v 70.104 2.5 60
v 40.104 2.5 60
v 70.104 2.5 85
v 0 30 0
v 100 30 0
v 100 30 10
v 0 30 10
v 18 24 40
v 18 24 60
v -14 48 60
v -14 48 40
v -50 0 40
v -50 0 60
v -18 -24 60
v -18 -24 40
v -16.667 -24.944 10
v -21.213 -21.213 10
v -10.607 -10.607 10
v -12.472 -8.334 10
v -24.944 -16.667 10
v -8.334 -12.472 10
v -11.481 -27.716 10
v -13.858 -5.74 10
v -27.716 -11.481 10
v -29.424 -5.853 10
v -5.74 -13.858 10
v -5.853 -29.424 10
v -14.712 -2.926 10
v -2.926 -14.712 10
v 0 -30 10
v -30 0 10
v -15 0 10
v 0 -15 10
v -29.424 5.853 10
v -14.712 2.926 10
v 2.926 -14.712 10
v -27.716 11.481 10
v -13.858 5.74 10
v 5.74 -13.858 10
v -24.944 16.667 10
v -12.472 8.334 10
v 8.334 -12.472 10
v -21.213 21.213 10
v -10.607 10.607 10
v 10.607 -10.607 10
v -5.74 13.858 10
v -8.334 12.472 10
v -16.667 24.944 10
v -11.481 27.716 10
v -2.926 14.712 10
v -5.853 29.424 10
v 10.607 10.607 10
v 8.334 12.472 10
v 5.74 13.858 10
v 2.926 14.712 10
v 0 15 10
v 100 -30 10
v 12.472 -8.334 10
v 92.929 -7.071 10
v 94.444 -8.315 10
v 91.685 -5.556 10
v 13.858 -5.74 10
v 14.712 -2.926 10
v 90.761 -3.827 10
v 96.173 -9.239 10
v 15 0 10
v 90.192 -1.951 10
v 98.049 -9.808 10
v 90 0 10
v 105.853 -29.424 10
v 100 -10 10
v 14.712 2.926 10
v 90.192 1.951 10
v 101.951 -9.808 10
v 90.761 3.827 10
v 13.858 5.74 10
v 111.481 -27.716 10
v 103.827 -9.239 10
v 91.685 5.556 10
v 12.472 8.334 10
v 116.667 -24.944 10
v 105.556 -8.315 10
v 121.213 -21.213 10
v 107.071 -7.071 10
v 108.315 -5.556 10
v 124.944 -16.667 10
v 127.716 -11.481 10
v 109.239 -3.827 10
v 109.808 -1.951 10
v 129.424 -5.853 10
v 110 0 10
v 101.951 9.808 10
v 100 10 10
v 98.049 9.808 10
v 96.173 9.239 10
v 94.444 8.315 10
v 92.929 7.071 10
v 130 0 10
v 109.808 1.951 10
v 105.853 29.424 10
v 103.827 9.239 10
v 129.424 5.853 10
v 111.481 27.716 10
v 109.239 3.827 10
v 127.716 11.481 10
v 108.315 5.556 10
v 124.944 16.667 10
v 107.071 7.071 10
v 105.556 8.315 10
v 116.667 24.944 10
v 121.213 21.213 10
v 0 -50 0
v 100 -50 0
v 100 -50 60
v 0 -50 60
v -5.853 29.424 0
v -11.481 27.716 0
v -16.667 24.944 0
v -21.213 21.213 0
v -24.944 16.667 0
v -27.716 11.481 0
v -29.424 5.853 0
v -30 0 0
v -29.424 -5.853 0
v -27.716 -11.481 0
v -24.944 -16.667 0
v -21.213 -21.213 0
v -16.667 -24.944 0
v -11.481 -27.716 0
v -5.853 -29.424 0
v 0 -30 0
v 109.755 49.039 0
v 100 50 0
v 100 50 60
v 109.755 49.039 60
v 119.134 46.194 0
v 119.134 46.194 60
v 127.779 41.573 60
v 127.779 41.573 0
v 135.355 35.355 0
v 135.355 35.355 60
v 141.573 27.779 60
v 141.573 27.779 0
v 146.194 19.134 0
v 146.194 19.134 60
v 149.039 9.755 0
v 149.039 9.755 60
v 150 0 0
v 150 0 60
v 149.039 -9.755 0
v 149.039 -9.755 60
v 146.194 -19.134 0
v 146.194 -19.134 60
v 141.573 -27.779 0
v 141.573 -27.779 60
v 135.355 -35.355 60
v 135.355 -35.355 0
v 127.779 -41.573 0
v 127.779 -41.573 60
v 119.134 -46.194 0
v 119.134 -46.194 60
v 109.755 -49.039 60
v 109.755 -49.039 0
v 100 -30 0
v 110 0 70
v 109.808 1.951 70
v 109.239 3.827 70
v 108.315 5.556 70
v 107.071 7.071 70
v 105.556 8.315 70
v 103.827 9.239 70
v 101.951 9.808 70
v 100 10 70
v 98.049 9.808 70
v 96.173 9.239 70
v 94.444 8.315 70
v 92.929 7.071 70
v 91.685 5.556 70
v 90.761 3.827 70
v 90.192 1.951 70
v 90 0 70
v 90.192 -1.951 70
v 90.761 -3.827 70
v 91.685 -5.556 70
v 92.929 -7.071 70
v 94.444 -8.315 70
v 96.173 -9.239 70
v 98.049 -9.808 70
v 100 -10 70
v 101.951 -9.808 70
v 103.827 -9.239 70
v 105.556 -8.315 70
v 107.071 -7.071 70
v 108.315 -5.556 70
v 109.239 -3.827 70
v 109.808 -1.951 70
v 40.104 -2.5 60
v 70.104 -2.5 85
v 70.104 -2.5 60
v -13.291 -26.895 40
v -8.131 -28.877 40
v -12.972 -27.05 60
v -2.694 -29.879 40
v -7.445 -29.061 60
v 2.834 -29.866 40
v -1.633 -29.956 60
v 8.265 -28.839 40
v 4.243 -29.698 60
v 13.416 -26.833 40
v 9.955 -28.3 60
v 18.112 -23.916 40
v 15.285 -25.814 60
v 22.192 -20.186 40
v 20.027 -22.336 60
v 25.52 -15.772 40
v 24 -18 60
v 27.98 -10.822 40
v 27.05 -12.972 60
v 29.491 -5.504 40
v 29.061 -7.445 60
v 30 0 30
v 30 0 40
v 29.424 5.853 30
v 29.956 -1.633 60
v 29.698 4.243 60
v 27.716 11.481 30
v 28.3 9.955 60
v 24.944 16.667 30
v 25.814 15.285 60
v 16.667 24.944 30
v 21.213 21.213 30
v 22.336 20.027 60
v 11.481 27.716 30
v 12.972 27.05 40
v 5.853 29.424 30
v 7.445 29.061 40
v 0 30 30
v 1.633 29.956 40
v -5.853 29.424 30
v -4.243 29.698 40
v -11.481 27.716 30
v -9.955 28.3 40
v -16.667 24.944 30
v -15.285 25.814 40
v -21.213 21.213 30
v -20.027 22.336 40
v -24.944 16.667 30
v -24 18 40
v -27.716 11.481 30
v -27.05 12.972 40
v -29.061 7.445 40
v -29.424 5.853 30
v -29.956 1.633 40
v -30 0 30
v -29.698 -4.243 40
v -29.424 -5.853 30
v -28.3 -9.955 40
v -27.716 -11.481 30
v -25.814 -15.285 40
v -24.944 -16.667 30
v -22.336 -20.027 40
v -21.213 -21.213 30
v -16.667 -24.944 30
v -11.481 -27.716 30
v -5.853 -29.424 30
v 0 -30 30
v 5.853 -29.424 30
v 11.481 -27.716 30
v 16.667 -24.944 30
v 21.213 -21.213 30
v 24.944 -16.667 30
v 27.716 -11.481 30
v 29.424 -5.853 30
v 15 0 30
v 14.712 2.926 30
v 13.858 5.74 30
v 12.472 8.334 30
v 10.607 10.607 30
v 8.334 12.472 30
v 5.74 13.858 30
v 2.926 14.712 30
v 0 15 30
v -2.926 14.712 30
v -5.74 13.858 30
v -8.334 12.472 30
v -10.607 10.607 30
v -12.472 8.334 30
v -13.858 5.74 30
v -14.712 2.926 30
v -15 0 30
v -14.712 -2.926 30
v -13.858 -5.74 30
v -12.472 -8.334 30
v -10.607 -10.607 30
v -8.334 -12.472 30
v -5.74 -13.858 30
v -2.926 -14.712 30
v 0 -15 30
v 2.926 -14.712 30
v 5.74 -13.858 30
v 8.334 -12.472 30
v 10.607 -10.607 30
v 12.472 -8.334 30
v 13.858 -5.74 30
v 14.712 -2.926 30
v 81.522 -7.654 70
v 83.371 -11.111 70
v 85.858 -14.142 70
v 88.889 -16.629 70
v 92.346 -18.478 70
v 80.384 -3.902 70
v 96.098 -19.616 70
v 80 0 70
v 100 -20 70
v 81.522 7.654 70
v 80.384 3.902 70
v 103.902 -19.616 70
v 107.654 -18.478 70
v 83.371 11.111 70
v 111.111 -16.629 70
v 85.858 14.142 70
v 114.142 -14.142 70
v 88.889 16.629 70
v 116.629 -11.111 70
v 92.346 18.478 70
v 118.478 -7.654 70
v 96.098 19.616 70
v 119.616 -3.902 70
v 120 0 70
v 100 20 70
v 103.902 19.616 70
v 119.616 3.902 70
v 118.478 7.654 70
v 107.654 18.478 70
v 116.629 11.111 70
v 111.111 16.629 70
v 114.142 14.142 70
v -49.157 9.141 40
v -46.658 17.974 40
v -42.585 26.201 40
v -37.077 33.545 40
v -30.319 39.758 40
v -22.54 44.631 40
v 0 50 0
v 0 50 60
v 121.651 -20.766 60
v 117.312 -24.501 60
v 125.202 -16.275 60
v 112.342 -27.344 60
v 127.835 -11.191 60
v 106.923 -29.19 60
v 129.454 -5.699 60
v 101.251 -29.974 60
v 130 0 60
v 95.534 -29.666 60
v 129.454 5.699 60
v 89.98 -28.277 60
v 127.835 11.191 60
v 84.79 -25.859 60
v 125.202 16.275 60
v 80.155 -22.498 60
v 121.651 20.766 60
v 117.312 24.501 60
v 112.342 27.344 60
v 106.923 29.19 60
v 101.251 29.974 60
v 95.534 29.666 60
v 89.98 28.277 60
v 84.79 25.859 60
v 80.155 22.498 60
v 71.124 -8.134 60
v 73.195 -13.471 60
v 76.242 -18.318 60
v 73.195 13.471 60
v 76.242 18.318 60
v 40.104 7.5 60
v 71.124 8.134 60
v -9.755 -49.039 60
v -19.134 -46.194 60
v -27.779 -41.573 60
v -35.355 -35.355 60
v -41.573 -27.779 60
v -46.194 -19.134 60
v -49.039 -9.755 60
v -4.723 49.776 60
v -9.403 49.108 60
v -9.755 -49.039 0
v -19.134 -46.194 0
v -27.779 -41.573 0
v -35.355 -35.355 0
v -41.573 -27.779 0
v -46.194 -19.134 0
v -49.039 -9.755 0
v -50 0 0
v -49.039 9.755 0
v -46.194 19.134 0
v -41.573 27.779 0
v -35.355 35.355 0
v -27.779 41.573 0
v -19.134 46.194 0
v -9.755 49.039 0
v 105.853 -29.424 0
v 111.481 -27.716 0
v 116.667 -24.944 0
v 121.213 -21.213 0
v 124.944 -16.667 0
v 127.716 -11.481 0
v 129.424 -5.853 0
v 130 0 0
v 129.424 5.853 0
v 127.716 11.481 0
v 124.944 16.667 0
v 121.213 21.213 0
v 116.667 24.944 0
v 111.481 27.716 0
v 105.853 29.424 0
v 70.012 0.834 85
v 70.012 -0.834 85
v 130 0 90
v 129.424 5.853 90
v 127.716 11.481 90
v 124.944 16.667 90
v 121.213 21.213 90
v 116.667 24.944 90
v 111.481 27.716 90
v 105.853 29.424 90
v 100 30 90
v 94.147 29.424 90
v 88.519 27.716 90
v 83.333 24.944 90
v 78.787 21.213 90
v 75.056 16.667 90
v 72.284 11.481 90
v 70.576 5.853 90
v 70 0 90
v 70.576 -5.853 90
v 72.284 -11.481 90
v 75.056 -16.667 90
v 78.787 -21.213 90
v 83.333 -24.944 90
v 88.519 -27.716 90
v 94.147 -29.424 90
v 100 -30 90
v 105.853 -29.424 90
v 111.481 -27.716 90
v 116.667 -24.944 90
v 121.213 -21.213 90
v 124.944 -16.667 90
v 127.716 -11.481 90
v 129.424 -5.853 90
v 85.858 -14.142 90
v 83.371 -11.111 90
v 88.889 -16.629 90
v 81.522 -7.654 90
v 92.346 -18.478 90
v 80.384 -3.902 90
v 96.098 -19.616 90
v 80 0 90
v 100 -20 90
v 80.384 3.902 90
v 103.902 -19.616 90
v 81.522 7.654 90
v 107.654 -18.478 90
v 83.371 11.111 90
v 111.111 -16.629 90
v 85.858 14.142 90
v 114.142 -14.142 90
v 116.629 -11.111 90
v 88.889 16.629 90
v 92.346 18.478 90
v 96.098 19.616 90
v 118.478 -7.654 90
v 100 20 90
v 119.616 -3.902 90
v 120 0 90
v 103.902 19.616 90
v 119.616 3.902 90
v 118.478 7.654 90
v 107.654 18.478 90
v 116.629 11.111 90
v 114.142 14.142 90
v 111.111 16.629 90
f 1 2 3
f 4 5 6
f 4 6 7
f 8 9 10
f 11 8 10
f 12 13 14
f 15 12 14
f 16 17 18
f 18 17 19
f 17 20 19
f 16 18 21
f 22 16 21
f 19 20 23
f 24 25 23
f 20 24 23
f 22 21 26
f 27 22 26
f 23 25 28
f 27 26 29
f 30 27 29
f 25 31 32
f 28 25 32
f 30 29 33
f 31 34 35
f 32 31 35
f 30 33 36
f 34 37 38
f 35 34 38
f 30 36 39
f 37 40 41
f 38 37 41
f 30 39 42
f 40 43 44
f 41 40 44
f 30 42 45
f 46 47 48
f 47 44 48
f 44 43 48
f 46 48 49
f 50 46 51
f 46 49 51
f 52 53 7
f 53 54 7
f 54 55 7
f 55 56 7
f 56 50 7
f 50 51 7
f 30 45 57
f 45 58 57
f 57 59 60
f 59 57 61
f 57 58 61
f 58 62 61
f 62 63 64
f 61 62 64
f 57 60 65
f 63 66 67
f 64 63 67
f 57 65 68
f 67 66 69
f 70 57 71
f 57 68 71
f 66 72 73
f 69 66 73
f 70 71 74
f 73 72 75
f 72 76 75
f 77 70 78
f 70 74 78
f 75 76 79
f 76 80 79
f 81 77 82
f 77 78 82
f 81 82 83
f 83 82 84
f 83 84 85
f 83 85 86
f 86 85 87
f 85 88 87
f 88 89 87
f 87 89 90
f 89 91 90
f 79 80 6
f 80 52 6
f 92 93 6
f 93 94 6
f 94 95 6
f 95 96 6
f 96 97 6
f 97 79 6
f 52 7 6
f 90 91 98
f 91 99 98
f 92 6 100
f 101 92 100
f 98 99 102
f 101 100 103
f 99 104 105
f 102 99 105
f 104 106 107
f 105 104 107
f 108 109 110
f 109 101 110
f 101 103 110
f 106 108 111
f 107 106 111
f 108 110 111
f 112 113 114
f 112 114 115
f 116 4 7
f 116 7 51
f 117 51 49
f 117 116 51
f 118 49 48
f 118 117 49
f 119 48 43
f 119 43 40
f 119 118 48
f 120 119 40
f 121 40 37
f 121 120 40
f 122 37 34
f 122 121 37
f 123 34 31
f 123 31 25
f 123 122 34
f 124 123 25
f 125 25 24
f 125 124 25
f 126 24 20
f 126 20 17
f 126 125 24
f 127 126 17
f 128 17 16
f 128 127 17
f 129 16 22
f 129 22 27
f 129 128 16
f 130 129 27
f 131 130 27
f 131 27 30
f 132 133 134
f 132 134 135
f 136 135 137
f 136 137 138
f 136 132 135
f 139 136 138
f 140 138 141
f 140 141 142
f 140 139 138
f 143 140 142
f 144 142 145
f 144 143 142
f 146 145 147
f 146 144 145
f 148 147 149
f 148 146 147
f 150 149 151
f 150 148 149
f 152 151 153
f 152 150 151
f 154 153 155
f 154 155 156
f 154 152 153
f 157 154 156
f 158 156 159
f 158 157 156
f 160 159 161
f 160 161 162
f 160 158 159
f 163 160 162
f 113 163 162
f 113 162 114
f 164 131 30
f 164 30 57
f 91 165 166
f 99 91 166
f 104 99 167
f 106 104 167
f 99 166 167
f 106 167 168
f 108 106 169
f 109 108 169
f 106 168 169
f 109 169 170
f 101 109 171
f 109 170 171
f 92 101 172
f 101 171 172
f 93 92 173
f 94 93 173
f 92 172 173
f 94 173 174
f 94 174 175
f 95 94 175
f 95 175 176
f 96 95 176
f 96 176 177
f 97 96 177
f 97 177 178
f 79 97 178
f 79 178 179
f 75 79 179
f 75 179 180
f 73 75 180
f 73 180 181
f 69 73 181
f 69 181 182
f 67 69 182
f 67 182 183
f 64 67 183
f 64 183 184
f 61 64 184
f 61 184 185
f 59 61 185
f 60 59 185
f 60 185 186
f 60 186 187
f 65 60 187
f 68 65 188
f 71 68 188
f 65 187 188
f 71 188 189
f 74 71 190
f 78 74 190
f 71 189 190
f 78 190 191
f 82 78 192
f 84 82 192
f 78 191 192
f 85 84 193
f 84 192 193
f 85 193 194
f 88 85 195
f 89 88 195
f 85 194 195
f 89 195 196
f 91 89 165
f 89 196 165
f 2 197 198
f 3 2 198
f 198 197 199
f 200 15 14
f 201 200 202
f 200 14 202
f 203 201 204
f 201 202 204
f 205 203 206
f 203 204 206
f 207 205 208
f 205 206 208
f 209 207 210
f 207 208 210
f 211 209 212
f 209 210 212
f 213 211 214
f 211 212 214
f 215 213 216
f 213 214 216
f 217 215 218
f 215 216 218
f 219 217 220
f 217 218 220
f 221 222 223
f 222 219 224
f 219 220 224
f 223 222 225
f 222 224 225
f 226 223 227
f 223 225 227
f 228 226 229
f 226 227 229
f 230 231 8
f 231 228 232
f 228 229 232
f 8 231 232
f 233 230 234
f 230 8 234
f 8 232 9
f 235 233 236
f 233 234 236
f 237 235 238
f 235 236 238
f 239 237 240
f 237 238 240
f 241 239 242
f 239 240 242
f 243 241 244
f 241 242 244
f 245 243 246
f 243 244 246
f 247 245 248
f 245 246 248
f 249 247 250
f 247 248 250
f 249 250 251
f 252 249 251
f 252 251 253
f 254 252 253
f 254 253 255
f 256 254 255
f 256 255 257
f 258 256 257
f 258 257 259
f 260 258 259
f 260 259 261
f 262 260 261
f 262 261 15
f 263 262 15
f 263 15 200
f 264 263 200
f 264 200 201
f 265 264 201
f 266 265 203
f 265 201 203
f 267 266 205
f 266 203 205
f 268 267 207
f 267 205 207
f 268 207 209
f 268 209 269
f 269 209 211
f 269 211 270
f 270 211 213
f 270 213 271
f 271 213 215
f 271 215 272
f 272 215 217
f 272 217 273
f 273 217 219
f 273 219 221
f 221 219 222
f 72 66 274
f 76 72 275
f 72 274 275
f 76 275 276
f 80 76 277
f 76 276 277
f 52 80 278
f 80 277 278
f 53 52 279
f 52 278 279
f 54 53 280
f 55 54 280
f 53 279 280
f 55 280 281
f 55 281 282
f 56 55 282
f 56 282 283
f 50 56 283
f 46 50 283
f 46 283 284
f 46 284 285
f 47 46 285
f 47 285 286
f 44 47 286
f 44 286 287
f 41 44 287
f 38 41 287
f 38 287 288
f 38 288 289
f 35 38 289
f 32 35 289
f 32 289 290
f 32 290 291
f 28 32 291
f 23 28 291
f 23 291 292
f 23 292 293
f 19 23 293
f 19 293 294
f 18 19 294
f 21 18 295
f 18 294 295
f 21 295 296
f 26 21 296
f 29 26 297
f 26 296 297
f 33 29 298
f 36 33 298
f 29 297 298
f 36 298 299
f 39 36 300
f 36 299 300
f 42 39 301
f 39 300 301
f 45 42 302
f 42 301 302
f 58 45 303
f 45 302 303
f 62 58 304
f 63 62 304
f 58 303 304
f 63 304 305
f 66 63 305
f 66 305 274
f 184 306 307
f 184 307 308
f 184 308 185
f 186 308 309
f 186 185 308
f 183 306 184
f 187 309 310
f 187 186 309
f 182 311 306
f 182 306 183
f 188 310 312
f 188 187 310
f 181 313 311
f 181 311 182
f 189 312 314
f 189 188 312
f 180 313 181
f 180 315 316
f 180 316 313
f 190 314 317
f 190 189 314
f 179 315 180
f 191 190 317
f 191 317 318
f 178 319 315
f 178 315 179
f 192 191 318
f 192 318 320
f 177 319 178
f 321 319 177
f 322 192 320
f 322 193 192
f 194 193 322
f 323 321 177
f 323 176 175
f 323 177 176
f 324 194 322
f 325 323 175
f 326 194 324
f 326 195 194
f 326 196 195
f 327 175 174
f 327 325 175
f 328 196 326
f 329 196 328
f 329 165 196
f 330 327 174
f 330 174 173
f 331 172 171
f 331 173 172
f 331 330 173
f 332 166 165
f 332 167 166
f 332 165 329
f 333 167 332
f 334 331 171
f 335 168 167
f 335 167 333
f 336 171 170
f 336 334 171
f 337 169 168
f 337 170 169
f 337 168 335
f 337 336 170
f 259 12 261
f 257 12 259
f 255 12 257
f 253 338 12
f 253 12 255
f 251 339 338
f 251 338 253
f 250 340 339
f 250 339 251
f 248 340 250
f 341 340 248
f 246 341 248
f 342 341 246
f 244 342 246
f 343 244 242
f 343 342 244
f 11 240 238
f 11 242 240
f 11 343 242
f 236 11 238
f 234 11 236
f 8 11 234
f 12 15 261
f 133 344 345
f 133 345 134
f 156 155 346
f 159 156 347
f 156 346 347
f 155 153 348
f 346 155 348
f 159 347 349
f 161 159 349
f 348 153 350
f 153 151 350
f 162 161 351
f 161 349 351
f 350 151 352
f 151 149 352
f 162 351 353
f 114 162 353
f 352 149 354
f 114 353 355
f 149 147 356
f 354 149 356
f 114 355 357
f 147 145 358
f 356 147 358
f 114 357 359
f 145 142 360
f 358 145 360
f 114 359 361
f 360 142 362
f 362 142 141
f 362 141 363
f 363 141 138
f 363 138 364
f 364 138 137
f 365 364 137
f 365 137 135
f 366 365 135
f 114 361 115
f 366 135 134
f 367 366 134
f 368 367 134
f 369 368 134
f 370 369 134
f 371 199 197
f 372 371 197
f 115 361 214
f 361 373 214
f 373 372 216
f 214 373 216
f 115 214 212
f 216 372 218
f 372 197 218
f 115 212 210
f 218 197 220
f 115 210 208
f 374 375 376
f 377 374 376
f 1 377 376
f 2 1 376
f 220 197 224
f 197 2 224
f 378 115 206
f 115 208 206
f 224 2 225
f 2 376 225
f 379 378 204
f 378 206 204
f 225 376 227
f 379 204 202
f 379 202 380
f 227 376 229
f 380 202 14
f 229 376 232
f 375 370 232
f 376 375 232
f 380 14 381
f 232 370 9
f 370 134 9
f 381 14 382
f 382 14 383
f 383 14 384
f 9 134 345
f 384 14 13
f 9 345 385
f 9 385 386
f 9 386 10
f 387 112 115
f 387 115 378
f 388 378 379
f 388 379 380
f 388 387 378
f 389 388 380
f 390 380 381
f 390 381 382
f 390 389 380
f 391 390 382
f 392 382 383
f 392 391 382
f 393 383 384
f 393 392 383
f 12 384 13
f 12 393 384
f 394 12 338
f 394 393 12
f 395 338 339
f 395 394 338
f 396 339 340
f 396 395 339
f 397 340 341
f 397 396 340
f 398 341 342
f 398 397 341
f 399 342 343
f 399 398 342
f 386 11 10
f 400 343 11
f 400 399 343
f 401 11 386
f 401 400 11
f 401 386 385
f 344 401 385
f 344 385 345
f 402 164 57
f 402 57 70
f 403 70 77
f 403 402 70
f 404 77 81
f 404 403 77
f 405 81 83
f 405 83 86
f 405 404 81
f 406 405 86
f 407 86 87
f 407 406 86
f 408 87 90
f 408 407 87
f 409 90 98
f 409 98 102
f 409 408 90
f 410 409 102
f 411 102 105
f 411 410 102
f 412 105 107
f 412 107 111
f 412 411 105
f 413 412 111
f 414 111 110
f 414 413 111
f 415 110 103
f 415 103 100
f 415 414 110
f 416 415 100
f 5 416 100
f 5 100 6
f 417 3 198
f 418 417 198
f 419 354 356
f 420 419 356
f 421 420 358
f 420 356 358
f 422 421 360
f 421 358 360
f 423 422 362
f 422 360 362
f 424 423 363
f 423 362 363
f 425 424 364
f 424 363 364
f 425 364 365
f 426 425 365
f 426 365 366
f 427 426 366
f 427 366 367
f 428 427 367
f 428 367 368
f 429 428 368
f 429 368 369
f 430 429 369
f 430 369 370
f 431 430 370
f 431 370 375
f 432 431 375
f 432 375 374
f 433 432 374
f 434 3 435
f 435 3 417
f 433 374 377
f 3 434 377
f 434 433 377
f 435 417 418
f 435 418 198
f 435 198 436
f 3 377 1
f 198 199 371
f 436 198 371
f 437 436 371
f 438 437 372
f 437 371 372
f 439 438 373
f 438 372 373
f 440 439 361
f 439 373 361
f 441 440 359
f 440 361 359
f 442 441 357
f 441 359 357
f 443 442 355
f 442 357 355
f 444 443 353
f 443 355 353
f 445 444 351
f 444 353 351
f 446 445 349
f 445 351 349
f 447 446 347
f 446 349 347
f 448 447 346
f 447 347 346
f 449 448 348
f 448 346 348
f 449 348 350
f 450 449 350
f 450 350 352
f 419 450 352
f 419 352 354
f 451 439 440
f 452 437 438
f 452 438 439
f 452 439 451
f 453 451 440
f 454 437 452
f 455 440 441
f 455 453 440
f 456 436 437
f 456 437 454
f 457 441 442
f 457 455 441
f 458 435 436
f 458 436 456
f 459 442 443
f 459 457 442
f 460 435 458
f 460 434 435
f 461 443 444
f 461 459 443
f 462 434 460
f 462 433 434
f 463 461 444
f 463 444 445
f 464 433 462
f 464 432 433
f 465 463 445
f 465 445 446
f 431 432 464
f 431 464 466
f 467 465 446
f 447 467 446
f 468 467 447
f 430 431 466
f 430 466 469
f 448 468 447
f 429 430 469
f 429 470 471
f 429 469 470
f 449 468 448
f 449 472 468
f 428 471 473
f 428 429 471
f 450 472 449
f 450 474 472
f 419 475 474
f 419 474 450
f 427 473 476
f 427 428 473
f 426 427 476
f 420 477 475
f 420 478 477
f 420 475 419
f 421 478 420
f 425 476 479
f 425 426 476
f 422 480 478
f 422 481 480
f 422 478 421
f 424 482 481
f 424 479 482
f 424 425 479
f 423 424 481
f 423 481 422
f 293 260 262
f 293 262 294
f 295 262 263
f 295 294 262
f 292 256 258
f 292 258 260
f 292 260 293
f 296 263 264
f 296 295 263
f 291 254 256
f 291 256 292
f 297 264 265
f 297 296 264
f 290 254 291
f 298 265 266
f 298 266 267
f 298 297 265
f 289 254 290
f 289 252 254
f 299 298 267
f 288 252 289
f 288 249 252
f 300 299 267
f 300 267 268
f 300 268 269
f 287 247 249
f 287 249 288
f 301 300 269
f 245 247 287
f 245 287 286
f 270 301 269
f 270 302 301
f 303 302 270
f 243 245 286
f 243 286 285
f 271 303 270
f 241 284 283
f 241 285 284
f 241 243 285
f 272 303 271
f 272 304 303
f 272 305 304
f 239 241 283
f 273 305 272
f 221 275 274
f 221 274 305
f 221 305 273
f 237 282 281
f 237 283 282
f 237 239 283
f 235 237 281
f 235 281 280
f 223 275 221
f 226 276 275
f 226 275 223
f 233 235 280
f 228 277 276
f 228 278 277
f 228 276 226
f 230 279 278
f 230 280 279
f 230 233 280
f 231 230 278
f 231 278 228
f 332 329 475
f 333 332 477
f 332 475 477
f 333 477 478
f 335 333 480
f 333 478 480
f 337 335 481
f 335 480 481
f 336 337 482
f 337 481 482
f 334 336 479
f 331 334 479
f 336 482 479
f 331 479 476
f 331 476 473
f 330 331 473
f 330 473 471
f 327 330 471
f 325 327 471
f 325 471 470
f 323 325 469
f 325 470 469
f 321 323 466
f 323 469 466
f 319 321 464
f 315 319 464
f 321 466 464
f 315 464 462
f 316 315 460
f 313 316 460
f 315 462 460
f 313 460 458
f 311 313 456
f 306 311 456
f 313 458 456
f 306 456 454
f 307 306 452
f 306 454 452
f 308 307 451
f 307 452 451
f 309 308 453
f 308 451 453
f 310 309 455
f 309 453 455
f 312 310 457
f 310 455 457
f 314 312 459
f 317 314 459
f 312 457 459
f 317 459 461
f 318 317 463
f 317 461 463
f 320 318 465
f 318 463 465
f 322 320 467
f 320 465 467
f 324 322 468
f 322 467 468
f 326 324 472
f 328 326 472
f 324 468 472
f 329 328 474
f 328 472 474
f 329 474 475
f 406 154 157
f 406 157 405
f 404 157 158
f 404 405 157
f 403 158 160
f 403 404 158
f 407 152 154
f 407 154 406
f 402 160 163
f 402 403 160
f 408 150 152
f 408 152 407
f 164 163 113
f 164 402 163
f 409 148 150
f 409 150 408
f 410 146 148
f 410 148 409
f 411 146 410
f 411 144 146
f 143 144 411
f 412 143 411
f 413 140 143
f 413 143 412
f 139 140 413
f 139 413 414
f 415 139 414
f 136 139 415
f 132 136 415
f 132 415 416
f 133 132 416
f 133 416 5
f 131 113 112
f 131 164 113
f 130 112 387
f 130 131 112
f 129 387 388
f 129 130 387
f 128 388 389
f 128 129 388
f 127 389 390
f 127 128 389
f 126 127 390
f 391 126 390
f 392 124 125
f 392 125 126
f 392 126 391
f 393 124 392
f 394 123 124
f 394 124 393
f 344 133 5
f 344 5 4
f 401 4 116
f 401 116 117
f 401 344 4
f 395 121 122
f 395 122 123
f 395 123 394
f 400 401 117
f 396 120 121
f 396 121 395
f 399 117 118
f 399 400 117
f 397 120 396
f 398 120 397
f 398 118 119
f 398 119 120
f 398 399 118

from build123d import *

# Parameters (mm, degrees)
BOSS_EXTRUDE1_DEPTH = 60
CUT_EXTRUDE1_DEPTH  = 10
SKETCH3_R           = 30
BOSS_EXTRUDE2_DEPTH = 30
SKETCH4_R           = 20
CUT_EXTRUDE3_DEPTH  = 20
SKETCH5_R           = 10
CUT_EXTRUDE4_DEPTH  = 129
SKETCH7_W           = 30
SKETCH7_H           = 5
BOSS_EXTRUDE3_DEPTH = 25
CUT_EXTRUDE5_DEPTH  = 20
SKETCH9_R           = 30
CUT_EXTRUDE6_DEPTH  = 10
SKETCH10_R          = 15
CUT_EXTRUDE7_DEPTH  = 155
CUT_EXTRUDE8_DEPTH  = 10


with BuildPart() as part:
    # Sketch1 → Boss-Extrude1 (new body)
    with BuildSketch(Plane.XY):
        with BuildLine():
            Line((0, 50), (100, 50))
            ThreePointArc((100, 50), (150, 0), (100, -50))
            Line((100, -50), (0, -50))
            ThreePointArc((0, -50), (-50, 0), (0, 50))
        make_face()
    extrude(amount=BOSS_EXTRUDE1_DEPTH)

    # Sketch2 → Cut-Extrude1 (cut)
    with BuildSketch(Plane(origin=(0, 0, 0), x_dir=(-1, 0, 0), z_dir=(0, 0, -1))):
        with BuildLine():
            Line((0, -30), (-100, -30))
            ThreePointArc((-100, -30), (-130, 0), (-100, 30))
            Line((-100, 30), (0, 30))
            ThreePointArc((0, 30), (30, 0), (0, -30))
        make_face()
    extrude(amount=-CUT_EXTRUDE1_DEPTH, mode=Mode.SUBTRACT)

    # Sketch3 → Boss-Extrude2 (add)
    with BuildSketch(Plane.XY.offset(60)):
        with Locations((100, 0)):
            Circle(SKETCH3_R)
    extrude(amount=BOSS_EXTRUDE2_DEPTH)

    # Sketch4 → Cut-Extrude3 (cut)
    with BuildSketch(Plane.XY.offset(90)):
        with Locations((100, 0)):
            Circle(SKETCH4_R)
    extrude(amount=-CUT_EXTRUDE3_DEPTH, mode=Mode.SUBTRACT)

    # Sketch5 → Cut-Extrude4 (cut)
    with BuildSketch(Plane.XY.offset(70)):
        with Locations((100, 0)):
            Circle(SKETCH5_R)
    extrude(amount=-CUT_EXTRUDE4_DEPTH, mode=Mode.SUBTRACT)

    # Sketch7 → Boss-Extrude3 (add)
    with BuildSketch(Plane.XY.offset(60)):
        with Locations((55.104348142, 0)):
            Rectangle(SKETCH7_W, SKETCH7_H)
    extrude(amount=BOSS_EXTRUDE3_DEPTH)

    # Sketch8 → Cut-Extrude5 (cut)
    with BuildSketch(Plane.XY.offset(60)):
        with BuildLine():
            ThreePointArc((-14, 48), (-40, 30), (-50, 0))
            Line((-50, 0), (-18, -24))
            ThreePointArc((-18, -24), (24, -18), (18, 24))
            Line((18, 24), (-14, 48))
        make_face()
    extrude(amount=-CUT_EXTRUDE5_DEPTH, mode=Mode.SUBTRACT)

    # Sketch9 → Cut-Extrude6 (cut)
    with BuildSketch(Plane.XY.offset(40)):
        Circle(SKETCH9_R)
    extrude(amount=-CUT_EXTRUDE6_DEPTH, mode=Mode.SUBTRACT)

    # Sketch10 → Cut-Extrude7 (cut)
    with BuildSketch(Plane.XY.offset(30)):
        Circle(SKETCH10_R)
    extrude(amount=-CUT_EXTRUDE7_DEPTH, mode=Mode.SUBTRACT)

    # Sketch11 → Cut-Extrude8 (cut)
    with BuildSketch(Plane.XZ.offset(2.5)):
        Polygon((40.104348142, 60), (70.104348142, 85), (40.104348142, 85), align=None)
    extrude(amount=-CUT_EXTRUDE8_DEPTH, mode=Mode.SUBTRACT)


solid = part.part
